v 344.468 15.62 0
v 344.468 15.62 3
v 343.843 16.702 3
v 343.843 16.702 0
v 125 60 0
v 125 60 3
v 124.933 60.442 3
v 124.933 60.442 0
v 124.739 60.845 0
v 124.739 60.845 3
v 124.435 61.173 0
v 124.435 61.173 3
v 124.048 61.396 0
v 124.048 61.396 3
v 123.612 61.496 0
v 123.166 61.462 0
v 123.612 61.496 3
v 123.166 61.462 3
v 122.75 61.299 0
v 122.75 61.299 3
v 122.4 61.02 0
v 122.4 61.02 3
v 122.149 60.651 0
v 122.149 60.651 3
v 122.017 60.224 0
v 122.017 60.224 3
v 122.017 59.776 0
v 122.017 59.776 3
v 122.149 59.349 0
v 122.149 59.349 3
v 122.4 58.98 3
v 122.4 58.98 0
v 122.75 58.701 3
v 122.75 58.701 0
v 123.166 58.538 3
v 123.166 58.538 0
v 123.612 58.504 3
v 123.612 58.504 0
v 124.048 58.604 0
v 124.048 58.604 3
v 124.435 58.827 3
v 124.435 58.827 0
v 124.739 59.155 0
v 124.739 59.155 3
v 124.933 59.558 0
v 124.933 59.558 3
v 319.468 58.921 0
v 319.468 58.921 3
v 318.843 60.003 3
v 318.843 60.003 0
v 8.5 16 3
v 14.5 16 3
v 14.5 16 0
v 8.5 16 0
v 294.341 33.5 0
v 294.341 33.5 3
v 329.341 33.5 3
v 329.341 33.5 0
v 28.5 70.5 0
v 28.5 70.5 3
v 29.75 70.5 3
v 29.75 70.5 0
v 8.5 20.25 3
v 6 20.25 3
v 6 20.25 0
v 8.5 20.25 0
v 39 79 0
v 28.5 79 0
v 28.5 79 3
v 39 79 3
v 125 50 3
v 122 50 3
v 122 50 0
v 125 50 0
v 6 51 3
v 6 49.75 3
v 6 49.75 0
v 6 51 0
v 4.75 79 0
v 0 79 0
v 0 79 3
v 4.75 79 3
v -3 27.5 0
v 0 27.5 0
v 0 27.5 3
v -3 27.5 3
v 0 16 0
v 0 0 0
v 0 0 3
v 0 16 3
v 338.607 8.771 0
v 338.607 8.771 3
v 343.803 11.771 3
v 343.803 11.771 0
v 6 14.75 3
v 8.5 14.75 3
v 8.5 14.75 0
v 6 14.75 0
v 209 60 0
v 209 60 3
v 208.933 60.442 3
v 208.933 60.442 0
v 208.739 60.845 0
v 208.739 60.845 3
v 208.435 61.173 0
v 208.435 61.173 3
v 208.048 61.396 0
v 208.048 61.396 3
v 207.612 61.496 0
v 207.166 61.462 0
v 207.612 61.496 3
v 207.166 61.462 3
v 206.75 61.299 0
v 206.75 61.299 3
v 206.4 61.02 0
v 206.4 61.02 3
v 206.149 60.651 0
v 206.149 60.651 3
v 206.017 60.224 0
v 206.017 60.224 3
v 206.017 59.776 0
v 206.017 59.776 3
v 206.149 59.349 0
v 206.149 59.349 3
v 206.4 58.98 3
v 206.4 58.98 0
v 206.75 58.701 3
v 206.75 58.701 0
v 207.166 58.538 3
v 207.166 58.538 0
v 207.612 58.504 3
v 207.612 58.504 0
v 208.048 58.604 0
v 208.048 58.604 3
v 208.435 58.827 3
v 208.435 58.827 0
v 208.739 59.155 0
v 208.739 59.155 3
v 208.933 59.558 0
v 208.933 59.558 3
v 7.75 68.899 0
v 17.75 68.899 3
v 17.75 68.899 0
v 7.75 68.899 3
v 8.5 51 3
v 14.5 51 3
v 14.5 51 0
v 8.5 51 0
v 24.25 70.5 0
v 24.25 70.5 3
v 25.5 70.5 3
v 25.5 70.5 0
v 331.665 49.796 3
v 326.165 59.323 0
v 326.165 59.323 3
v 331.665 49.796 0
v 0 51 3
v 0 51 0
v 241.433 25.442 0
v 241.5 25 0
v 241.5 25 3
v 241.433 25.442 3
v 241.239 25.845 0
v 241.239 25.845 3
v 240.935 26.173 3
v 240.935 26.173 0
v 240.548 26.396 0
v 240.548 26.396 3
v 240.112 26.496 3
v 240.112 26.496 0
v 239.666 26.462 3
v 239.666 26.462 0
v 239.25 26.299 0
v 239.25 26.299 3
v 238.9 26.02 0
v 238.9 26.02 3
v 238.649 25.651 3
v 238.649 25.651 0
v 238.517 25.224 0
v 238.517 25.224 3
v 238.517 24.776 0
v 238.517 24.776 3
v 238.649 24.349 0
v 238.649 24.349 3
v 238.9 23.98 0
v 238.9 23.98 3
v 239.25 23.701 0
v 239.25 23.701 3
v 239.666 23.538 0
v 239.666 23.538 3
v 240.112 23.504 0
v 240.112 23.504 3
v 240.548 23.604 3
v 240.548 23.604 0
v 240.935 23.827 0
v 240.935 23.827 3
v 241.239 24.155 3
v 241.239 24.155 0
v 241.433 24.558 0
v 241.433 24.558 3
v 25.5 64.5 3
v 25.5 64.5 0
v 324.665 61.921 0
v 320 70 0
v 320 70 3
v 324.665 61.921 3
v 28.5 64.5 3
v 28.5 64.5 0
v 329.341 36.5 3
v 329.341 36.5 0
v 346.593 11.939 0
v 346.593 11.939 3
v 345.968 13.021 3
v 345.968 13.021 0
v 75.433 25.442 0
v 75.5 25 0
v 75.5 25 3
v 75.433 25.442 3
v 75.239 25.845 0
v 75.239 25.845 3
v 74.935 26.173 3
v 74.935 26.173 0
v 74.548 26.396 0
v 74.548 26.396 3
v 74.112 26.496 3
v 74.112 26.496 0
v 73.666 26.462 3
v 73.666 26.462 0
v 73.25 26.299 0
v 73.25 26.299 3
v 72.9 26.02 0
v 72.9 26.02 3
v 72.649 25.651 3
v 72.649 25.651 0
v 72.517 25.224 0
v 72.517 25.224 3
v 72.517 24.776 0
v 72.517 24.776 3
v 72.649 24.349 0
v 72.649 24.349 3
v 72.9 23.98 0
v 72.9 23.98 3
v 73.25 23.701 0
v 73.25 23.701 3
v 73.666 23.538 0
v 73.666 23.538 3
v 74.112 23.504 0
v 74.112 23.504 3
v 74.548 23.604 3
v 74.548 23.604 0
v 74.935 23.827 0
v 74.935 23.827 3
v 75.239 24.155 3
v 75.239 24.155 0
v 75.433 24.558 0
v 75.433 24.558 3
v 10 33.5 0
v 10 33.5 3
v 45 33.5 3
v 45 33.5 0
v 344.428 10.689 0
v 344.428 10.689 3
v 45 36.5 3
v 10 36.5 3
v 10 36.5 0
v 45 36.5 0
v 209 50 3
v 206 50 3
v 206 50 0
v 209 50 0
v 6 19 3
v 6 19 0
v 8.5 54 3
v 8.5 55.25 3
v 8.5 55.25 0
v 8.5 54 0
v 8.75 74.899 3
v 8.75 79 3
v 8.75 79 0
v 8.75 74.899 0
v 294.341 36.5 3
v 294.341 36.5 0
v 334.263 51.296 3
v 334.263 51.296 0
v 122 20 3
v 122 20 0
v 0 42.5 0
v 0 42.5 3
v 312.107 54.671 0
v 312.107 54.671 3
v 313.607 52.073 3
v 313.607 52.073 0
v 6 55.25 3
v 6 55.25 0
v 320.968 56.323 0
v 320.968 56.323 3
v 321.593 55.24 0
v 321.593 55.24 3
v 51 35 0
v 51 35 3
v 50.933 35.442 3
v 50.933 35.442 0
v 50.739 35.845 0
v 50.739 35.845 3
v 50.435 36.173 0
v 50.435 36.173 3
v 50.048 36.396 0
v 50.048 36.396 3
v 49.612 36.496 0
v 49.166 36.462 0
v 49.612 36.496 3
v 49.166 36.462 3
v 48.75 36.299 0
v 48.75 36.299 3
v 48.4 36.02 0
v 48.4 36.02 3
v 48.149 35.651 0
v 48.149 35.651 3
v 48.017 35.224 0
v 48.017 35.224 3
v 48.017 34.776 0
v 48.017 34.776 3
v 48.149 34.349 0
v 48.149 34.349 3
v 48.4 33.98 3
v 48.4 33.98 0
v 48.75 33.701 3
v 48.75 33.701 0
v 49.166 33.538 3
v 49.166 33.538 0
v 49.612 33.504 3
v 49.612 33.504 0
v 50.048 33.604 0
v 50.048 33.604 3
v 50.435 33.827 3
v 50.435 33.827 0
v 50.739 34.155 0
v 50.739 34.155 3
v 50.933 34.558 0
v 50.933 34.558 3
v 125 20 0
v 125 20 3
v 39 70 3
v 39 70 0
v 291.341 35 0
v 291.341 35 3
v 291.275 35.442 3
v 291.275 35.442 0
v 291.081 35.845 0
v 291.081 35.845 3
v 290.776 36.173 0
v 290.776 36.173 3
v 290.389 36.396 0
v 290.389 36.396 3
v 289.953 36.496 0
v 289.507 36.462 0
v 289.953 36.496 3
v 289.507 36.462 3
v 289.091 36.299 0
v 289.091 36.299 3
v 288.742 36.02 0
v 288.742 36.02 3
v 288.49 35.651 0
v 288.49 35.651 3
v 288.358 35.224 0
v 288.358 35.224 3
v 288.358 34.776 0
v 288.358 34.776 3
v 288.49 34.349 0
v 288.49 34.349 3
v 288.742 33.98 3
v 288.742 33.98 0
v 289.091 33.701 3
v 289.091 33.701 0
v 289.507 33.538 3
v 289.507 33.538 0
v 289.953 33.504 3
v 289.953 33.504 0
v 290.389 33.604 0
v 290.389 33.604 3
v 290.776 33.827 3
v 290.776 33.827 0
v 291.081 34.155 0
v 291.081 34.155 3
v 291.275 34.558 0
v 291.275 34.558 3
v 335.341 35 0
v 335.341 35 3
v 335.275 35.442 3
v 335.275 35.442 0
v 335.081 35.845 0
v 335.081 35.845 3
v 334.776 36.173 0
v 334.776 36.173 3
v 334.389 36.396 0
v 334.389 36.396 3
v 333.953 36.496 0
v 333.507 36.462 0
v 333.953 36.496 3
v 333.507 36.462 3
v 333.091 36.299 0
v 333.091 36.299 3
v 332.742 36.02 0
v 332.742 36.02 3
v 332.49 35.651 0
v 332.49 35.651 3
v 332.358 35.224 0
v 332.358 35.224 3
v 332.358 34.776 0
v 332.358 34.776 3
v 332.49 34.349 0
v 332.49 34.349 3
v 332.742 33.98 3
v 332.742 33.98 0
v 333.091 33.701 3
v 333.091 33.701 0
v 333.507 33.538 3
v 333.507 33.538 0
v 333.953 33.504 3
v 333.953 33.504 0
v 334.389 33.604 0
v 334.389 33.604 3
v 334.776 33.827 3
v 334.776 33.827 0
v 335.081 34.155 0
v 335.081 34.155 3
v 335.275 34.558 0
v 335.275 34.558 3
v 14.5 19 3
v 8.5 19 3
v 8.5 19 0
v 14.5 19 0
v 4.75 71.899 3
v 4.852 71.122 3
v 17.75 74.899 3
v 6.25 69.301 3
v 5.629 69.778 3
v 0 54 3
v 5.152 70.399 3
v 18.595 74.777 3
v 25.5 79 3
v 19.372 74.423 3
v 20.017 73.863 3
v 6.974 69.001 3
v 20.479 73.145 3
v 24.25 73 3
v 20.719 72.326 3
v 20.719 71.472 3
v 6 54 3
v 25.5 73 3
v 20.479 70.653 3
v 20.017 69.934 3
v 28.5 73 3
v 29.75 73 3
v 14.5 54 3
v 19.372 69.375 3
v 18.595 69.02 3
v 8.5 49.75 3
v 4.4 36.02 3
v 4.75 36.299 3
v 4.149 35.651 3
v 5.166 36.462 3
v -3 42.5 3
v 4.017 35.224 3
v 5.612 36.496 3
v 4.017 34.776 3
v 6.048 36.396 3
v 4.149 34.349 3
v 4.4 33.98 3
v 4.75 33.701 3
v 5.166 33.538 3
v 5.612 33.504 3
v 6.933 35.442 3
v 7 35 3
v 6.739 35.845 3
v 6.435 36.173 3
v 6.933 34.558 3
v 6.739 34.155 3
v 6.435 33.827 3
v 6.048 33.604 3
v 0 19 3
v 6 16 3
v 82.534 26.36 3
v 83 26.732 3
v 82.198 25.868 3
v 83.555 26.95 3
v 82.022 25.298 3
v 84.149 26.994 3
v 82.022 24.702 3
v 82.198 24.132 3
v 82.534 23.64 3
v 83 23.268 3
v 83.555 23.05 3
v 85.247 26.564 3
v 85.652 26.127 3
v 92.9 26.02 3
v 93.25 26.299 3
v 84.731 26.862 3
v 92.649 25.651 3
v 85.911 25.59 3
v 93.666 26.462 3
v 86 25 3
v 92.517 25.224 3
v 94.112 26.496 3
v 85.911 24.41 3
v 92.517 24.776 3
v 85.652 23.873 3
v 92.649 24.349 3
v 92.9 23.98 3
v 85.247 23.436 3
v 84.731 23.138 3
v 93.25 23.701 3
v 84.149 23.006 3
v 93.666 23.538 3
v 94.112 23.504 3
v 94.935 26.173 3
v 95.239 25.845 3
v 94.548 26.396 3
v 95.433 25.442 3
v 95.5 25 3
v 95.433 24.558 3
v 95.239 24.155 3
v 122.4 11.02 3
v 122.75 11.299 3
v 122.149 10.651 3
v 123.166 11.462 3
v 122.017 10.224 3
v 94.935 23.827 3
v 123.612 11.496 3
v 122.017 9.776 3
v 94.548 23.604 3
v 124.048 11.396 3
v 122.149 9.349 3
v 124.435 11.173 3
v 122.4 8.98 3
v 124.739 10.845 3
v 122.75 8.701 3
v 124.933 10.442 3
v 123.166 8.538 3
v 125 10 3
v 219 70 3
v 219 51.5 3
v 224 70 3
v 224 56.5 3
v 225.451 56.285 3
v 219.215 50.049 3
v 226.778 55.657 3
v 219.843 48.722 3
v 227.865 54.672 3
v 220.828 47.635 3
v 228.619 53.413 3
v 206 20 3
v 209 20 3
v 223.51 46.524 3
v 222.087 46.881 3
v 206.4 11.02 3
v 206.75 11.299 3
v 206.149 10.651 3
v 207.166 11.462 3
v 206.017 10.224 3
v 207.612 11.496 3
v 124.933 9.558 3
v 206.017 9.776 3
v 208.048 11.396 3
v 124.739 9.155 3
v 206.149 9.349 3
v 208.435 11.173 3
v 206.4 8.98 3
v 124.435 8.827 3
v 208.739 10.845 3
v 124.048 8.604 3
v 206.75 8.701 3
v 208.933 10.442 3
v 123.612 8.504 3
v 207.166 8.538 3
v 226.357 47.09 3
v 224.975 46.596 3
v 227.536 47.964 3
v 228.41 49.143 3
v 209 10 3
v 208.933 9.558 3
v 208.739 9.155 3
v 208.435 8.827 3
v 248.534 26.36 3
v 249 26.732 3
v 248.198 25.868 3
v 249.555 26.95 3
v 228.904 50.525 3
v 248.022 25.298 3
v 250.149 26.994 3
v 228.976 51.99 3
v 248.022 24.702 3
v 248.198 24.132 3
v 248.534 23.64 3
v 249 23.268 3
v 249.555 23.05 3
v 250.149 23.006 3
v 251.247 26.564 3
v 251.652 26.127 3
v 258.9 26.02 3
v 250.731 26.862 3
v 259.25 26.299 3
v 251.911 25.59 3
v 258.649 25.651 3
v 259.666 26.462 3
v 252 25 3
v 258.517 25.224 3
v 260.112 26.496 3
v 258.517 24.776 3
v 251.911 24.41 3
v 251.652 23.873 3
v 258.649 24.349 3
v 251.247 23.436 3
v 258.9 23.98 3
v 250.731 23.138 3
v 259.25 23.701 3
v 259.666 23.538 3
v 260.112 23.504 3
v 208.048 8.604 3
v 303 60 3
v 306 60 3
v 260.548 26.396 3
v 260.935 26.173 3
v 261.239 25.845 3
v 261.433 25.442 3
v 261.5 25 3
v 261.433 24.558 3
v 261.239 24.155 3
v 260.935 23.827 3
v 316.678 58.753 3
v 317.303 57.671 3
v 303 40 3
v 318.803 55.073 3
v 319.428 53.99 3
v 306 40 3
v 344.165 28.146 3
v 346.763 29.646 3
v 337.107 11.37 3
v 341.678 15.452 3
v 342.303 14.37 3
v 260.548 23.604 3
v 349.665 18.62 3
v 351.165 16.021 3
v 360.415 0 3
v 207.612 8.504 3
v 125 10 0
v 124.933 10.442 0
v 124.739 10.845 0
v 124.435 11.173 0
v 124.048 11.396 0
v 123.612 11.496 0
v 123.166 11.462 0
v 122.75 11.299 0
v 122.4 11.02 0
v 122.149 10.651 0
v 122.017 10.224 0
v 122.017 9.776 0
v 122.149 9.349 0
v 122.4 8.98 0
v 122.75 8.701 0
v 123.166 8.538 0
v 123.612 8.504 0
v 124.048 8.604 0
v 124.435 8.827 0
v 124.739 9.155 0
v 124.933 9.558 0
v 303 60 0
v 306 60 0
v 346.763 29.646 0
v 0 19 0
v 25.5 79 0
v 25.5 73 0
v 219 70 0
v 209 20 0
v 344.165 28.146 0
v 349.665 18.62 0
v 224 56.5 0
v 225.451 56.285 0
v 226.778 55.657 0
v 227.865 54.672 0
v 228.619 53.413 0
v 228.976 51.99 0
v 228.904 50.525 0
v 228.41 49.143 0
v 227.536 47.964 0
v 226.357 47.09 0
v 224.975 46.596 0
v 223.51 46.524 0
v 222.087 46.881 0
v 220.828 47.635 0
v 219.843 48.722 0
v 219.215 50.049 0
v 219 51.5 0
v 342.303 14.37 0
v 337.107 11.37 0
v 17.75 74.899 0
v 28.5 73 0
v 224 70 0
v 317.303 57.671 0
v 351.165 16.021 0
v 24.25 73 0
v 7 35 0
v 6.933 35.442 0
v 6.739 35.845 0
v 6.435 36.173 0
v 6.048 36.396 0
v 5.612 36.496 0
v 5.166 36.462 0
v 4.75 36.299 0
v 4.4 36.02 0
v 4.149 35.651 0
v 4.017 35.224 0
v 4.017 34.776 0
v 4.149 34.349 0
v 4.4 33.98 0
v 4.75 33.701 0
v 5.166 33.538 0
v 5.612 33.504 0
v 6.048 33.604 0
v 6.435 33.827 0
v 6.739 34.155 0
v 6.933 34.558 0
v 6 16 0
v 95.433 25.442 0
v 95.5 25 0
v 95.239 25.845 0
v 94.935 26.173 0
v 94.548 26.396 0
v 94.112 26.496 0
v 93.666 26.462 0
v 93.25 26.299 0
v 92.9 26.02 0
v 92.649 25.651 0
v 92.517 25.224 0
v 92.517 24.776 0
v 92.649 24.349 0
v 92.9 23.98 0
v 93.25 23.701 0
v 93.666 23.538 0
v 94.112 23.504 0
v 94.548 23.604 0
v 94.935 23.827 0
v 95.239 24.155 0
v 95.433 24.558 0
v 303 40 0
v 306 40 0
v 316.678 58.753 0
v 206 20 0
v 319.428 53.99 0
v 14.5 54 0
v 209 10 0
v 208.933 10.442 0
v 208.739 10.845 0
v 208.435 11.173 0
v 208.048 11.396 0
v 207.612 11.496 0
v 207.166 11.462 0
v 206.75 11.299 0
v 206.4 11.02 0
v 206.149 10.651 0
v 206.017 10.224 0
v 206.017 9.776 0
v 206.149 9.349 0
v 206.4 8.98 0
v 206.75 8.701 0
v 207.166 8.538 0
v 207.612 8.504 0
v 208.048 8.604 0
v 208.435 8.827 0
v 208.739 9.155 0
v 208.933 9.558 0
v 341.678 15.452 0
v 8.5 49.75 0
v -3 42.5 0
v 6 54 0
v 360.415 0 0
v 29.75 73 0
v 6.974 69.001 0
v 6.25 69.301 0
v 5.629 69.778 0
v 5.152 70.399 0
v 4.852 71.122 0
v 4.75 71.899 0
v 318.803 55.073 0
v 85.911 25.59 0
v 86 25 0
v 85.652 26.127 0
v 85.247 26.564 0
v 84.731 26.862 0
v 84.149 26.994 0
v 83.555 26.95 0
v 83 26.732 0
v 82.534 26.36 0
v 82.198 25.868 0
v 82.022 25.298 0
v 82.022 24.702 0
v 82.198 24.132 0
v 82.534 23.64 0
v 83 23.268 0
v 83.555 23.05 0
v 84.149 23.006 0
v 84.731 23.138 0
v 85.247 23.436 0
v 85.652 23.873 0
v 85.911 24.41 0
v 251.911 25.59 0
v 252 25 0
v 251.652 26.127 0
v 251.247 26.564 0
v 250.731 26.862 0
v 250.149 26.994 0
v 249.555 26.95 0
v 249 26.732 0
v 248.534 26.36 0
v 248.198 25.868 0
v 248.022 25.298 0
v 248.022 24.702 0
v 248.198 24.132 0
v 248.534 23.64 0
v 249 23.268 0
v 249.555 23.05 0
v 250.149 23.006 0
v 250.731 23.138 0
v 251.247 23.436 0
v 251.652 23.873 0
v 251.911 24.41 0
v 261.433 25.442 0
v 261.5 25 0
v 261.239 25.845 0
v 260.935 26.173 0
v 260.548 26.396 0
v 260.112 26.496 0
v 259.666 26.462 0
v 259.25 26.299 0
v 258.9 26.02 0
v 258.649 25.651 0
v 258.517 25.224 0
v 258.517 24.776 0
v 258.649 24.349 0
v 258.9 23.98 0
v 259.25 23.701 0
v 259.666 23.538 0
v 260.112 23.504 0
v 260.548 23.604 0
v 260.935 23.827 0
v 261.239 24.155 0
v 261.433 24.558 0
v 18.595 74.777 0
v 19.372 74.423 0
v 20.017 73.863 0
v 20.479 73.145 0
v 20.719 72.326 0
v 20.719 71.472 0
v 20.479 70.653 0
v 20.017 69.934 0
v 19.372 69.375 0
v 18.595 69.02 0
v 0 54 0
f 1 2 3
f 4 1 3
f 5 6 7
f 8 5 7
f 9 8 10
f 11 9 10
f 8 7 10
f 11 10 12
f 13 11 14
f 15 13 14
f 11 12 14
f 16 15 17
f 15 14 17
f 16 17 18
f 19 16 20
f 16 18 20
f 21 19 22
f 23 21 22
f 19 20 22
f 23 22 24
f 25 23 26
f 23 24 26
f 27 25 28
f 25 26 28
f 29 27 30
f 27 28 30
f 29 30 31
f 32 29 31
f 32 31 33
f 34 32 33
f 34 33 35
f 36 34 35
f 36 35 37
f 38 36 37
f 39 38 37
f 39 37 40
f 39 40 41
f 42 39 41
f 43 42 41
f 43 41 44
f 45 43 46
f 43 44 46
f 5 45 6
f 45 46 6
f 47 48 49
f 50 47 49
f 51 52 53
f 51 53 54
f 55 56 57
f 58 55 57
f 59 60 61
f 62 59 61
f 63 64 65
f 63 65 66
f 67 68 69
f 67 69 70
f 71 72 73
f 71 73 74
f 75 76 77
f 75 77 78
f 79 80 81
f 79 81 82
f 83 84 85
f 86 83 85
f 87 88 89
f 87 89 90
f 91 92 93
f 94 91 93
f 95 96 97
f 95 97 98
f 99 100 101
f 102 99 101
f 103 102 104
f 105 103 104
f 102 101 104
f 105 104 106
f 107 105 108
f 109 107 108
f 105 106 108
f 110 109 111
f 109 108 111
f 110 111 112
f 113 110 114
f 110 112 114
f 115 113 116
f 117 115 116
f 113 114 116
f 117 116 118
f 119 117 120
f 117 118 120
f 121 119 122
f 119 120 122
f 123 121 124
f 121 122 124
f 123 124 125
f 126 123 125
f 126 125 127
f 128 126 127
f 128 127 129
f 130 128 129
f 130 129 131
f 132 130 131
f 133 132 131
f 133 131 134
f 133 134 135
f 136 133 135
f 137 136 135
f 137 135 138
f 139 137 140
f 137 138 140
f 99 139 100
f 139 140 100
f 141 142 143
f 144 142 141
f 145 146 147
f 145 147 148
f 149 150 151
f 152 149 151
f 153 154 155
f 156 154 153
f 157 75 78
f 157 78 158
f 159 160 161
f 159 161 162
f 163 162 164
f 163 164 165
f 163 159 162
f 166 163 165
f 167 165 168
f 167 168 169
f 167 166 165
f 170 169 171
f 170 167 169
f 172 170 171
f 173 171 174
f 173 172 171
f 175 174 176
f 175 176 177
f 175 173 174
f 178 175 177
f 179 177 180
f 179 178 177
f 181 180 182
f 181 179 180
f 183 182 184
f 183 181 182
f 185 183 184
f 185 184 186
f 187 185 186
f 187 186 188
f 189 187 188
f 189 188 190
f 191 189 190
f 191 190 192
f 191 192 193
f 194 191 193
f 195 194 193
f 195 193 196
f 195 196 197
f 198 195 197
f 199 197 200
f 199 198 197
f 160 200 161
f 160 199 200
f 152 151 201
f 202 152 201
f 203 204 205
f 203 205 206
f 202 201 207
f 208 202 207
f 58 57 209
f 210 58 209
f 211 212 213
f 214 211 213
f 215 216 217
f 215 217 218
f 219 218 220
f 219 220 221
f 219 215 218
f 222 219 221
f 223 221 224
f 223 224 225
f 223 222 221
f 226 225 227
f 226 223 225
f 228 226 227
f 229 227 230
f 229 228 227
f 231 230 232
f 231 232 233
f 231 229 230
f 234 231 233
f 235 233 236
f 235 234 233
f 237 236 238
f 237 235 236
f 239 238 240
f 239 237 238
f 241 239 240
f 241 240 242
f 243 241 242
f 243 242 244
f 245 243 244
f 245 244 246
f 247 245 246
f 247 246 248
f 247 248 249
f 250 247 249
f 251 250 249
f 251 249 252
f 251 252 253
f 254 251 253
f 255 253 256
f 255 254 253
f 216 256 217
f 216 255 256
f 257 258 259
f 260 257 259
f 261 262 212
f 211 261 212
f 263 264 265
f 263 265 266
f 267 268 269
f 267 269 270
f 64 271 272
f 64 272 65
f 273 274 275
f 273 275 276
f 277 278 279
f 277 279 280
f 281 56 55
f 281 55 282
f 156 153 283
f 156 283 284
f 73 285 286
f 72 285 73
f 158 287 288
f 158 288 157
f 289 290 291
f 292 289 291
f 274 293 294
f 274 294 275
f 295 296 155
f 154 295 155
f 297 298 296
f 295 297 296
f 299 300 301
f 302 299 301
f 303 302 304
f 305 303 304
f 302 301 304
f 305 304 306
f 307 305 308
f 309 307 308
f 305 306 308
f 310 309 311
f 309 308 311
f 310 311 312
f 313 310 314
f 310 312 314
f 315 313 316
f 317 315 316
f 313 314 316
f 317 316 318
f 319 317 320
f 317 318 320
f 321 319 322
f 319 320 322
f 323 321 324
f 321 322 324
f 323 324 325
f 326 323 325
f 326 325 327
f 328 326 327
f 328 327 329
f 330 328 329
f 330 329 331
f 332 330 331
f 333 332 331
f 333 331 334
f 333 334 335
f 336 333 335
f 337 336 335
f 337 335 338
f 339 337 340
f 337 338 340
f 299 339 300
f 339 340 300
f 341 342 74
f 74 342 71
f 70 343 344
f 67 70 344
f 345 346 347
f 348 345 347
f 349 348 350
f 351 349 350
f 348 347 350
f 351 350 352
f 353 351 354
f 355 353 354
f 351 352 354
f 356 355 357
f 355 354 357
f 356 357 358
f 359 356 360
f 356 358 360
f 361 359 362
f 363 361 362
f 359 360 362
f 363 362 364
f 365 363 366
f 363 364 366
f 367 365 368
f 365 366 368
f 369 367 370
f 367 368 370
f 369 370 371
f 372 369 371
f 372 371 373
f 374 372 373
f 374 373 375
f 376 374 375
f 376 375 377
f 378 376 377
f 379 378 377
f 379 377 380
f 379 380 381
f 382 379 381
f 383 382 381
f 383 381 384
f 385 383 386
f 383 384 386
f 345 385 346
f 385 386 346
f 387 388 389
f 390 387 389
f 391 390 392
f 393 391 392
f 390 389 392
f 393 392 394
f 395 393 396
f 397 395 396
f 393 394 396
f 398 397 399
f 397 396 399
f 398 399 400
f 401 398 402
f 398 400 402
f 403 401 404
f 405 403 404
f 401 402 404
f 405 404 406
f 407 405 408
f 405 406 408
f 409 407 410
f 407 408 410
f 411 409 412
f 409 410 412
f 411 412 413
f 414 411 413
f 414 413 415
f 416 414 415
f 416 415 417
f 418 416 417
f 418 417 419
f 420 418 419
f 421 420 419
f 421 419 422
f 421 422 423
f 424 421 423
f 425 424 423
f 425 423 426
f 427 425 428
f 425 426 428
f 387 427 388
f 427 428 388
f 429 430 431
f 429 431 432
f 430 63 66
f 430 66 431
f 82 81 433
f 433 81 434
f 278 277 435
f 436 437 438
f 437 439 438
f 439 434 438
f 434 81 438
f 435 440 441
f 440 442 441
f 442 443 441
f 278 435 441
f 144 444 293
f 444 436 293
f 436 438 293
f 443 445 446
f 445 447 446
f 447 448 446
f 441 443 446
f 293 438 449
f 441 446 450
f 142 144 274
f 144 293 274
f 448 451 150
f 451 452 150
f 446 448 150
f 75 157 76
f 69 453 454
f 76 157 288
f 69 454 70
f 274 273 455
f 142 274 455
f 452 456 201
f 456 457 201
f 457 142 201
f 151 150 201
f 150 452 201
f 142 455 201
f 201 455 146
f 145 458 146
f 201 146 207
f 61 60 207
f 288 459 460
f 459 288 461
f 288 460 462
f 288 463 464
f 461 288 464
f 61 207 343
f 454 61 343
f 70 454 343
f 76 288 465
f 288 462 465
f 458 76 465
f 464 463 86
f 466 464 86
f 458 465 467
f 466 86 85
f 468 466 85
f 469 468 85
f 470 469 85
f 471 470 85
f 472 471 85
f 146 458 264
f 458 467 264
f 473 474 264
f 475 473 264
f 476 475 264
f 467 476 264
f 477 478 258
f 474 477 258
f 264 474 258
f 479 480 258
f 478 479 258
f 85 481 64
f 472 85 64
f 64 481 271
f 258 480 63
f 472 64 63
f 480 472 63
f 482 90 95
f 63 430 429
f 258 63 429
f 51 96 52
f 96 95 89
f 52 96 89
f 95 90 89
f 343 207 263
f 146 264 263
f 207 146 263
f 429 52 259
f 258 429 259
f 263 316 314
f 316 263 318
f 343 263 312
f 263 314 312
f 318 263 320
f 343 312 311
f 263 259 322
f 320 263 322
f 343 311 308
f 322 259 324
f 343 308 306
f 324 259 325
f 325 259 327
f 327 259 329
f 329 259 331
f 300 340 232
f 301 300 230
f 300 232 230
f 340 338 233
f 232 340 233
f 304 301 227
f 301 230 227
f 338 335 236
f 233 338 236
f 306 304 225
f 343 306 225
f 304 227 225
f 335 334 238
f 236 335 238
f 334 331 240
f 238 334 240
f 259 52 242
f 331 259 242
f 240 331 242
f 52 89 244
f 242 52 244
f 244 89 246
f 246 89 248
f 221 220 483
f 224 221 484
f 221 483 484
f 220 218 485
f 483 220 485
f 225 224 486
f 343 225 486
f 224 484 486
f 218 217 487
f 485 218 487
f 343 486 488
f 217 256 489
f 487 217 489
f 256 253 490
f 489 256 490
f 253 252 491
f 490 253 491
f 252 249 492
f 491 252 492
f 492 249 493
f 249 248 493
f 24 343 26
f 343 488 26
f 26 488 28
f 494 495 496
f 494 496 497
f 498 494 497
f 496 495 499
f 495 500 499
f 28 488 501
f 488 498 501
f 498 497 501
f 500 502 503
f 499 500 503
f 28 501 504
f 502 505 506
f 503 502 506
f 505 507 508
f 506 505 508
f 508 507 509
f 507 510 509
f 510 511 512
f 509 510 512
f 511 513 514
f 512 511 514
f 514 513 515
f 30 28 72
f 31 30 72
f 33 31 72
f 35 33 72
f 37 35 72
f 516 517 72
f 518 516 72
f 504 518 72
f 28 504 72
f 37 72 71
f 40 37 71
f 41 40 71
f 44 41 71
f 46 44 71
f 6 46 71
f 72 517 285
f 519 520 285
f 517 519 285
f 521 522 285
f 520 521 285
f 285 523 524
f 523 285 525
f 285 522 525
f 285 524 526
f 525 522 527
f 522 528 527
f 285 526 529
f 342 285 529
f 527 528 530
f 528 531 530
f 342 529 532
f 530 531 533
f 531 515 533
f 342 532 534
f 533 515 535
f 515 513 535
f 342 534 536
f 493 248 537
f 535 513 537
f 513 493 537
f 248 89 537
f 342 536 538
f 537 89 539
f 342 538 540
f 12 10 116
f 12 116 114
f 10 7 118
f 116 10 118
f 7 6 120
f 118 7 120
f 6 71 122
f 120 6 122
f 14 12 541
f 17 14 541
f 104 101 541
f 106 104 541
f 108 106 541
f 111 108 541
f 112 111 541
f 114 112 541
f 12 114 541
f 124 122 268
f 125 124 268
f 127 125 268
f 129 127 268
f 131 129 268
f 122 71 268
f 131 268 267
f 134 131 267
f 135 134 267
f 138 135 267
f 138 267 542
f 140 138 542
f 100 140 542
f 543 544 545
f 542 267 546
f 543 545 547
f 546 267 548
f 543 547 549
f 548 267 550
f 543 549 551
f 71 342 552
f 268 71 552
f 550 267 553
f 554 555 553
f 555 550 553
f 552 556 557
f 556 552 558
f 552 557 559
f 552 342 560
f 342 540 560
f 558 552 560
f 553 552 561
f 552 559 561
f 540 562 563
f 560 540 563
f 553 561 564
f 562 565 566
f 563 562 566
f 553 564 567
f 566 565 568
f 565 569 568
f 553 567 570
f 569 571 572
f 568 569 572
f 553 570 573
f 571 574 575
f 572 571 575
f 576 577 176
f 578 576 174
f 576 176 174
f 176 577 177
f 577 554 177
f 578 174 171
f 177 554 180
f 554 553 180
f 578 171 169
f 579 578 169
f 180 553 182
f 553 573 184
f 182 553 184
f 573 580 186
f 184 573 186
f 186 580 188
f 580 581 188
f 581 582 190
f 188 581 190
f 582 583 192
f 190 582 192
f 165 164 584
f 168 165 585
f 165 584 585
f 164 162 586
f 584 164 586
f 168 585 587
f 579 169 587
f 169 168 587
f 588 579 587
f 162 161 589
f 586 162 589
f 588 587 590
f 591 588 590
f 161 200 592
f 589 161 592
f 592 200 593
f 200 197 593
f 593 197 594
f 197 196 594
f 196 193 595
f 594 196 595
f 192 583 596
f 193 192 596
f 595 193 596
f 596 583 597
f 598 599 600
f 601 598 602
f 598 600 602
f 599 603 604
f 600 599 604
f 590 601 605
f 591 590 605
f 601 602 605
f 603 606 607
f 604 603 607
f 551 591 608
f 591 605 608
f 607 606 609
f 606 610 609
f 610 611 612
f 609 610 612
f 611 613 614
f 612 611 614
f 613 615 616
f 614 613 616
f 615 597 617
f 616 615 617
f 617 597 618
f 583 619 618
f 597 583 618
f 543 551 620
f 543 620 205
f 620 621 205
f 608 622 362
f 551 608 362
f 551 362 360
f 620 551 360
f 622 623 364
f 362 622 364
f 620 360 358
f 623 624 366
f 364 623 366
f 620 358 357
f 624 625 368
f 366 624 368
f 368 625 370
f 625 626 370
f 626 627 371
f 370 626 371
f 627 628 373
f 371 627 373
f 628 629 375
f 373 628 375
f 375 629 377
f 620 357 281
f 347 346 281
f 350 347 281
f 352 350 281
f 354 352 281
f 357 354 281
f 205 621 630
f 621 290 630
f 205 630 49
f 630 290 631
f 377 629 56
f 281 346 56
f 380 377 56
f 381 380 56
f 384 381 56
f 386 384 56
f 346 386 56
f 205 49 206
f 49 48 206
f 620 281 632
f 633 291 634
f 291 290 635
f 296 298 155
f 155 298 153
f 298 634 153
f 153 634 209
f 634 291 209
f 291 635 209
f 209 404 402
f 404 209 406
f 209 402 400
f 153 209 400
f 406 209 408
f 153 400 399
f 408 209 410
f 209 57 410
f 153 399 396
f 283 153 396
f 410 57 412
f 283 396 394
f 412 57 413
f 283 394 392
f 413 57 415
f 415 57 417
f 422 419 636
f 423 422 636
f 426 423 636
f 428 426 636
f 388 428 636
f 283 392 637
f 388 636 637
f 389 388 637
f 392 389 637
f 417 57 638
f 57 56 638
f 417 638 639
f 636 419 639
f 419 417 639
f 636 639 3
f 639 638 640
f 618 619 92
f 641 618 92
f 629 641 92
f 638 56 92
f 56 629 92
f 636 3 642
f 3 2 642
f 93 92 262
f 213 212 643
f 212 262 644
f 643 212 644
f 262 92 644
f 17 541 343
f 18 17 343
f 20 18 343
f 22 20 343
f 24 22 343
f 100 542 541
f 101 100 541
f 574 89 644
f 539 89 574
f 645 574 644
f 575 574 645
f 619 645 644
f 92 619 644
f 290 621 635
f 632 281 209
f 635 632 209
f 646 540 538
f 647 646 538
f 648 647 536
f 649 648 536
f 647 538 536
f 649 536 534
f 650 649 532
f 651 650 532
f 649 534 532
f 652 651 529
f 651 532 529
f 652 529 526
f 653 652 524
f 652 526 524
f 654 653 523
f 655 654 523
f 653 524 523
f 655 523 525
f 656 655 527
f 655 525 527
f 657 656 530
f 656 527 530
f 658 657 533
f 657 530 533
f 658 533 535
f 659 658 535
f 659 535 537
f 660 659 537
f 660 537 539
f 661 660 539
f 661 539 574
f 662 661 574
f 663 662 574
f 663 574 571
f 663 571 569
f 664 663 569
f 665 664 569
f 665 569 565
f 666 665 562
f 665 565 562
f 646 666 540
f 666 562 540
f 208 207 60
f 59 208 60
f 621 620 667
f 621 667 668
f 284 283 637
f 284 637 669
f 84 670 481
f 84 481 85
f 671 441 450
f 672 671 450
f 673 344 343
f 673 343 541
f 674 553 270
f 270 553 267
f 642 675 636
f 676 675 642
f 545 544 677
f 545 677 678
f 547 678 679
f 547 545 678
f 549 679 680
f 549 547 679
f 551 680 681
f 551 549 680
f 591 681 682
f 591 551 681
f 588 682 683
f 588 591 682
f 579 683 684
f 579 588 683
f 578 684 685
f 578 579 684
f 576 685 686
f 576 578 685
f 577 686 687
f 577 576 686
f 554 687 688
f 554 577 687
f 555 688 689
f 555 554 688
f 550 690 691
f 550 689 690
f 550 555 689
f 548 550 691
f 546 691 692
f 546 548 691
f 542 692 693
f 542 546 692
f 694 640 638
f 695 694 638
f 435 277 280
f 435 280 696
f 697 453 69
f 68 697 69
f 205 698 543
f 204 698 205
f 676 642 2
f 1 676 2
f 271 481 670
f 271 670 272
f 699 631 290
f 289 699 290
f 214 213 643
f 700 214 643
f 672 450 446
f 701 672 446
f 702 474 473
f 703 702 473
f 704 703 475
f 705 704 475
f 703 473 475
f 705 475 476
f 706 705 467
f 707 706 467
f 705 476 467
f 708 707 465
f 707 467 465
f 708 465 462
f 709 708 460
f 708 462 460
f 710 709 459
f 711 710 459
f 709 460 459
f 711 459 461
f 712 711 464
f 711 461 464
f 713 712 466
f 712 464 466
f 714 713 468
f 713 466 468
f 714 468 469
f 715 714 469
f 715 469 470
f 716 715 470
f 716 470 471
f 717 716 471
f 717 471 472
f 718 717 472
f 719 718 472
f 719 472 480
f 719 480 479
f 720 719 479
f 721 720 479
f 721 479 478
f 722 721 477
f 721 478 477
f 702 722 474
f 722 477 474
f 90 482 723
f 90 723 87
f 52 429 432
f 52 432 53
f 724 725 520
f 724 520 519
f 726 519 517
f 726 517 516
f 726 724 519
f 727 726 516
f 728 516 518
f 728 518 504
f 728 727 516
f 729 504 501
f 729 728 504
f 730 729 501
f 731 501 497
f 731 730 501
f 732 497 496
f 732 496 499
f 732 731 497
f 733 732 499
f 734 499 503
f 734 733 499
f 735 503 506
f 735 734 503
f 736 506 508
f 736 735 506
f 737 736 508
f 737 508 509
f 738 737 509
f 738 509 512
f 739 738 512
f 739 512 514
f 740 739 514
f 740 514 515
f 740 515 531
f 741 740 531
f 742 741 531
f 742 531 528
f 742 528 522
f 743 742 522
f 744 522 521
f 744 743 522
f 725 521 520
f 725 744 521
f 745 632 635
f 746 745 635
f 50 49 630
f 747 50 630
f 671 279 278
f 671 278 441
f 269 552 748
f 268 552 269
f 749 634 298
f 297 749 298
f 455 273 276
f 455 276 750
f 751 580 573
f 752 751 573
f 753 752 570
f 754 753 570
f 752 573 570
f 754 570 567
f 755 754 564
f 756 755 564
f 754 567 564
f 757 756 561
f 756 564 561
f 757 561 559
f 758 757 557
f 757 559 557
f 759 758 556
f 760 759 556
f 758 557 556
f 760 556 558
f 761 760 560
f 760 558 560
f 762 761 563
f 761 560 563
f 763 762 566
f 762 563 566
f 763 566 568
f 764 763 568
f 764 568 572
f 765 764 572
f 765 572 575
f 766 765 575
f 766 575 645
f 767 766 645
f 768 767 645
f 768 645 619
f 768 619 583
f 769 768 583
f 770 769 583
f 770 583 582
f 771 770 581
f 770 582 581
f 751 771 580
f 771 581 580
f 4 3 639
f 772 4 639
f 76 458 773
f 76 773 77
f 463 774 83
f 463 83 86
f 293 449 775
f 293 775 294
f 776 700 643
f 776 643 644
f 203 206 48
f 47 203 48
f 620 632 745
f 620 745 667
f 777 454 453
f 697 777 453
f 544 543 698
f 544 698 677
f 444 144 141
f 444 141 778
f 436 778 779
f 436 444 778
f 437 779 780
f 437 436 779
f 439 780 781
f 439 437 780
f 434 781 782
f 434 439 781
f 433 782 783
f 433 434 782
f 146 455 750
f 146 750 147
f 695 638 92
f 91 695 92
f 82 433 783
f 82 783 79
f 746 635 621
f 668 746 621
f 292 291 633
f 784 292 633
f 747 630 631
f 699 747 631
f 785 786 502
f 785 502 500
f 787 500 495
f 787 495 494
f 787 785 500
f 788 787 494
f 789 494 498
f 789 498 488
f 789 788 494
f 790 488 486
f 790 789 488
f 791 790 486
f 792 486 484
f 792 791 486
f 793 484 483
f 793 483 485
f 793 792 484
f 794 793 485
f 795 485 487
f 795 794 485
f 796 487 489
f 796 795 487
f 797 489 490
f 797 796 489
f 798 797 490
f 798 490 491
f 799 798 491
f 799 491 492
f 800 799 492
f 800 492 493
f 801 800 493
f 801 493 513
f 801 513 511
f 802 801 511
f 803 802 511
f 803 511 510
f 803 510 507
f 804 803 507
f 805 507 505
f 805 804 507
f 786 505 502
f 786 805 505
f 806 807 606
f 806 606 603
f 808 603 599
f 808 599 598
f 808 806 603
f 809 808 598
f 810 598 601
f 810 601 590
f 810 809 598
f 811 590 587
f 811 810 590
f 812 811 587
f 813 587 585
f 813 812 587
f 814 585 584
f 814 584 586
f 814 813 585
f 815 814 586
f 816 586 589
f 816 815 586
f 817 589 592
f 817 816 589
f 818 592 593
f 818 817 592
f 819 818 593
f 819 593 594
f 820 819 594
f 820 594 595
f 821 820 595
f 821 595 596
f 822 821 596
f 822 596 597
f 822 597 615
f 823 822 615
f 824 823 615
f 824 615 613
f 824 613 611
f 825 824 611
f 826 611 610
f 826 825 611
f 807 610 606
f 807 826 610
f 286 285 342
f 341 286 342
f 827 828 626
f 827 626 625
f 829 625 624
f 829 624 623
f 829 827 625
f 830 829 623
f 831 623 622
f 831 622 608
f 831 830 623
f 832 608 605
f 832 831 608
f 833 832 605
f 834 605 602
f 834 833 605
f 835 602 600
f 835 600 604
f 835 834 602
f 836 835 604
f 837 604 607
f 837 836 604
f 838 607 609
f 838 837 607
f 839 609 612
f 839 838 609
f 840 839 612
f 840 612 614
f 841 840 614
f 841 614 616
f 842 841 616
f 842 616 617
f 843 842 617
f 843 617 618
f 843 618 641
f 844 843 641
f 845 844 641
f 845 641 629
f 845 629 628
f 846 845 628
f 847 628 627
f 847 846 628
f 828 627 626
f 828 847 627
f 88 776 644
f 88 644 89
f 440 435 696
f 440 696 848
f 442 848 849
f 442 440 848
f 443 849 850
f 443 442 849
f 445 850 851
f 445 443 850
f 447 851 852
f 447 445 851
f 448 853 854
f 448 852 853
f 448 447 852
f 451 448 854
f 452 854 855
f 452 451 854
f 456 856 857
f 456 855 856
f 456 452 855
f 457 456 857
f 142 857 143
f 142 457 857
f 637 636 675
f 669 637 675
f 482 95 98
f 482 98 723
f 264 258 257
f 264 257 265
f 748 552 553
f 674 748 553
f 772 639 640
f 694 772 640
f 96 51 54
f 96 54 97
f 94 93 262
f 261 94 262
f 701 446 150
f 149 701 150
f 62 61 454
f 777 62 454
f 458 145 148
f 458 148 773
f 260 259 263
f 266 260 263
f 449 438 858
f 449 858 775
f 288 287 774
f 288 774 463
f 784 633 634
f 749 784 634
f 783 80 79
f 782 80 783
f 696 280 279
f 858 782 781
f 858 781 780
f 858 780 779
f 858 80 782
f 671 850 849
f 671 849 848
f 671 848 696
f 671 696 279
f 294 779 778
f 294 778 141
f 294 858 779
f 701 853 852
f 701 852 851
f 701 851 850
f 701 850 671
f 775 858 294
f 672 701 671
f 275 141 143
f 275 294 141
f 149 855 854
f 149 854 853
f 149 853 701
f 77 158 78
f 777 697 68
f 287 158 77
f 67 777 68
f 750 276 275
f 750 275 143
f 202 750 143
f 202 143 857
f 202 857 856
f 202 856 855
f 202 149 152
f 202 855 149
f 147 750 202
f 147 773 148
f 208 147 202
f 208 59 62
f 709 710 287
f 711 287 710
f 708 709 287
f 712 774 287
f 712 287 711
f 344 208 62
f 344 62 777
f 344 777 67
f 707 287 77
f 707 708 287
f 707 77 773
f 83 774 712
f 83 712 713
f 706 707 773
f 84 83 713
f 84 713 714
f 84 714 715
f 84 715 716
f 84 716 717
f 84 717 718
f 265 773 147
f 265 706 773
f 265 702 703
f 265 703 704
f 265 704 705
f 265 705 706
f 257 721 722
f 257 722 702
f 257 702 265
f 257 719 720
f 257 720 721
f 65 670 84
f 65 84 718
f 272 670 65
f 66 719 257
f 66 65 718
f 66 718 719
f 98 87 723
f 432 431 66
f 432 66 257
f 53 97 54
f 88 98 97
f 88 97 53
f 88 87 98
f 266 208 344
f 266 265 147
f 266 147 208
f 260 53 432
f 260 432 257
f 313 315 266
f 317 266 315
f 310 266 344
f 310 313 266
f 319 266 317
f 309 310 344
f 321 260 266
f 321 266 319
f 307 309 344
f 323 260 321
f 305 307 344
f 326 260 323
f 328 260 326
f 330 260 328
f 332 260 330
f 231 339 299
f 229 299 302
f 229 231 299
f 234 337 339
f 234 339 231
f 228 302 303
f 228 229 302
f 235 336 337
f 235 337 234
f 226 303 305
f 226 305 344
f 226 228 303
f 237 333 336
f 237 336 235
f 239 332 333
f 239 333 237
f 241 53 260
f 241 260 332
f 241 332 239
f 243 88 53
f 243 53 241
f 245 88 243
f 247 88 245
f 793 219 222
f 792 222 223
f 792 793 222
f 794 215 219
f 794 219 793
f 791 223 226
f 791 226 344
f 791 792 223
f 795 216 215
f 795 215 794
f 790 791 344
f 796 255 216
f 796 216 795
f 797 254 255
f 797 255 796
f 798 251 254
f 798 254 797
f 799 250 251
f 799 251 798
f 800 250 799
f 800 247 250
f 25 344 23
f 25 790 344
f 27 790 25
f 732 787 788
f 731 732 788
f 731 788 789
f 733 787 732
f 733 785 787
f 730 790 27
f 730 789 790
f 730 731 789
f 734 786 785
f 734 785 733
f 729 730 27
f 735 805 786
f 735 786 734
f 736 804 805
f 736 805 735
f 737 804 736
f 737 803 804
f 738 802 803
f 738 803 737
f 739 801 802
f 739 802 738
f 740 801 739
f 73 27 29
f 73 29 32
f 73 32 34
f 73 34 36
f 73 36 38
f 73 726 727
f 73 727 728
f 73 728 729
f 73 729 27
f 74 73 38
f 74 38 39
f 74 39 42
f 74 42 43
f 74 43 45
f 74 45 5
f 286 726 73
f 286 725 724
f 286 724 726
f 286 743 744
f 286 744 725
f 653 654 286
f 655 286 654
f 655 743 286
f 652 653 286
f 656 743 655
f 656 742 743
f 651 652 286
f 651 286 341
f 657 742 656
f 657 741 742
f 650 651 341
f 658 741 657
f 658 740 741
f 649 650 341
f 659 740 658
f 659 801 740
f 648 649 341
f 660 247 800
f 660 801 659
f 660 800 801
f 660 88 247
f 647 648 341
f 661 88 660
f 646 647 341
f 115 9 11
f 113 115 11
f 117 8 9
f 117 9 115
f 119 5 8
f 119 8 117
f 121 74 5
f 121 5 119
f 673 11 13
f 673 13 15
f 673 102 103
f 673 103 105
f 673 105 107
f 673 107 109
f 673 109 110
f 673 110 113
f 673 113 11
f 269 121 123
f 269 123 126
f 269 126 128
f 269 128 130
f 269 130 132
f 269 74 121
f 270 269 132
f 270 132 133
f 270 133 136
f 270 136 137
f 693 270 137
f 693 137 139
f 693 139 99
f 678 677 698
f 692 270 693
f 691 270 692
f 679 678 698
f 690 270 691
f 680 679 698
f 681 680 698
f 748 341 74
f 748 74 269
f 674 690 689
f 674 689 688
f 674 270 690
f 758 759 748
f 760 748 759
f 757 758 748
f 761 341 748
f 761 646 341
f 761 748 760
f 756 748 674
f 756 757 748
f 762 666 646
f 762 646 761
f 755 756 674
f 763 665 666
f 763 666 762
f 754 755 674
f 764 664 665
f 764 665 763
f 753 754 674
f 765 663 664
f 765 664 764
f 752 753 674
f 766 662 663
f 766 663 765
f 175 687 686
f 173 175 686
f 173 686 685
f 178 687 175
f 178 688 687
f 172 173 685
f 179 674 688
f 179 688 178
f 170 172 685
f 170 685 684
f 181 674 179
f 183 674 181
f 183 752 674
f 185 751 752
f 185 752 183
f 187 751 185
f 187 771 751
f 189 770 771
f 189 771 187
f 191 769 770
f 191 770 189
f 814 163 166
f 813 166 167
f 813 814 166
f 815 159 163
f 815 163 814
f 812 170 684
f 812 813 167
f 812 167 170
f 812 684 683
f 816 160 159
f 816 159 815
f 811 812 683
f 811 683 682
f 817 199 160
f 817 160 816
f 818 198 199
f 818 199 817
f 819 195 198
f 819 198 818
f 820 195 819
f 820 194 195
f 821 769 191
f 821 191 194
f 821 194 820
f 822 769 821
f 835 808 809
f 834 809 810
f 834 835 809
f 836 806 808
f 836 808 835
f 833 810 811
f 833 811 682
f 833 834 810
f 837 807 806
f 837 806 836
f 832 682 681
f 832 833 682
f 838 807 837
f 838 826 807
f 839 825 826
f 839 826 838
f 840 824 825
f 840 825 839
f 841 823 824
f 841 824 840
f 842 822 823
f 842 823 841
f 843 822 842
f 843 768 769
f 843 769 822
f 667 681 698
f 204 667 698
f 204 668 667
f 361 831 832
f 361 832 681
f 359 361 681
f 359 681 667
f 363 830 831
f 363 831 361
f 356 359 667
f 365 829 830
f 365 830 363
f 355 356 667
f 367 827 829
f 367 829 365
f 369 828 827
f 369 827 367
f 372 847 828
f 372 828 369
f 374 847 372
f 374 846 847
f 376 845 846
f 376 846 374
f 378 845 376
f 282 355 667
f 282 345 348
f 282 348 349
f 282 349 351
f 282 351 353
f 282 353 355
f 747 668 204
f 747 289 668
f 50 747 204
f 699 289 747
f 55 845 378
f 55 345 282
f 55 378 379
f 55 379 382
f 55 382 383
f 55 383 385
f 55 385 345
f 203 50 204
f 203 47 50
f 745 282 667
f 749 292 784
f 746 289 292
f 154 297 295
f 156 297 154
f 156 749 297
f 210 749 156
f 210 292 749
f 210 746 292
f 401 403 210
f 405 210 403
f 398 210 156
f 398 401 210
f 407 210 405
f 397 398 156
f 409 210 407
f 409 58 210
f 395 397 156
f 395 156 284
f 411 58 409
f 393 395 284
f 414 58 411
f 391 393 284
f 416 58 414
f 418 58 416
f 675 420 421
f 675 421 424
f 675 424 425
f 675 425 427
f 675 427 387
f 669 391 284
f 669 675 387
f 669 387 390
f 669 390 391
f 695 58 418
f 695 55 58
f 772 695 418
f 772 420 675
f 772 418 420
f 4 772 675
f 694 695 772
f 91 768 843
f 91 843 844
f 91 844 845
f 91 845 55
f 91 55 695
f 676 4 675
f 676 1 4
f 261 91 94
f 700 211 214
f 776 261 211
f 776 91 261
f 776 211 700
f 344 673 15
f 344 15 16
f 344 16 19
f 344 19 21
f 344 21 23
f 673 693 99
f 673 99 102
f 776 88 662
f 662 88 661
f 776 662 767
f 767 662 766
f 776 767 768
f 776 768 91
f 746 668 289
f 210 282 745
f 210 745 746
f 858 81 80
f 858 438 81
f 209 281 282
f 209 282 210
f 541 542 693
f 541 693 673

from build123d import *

# Parameters (mm, degrees)
SKETCH_1_R             = 2
SKETCH_1_R_2           = 1.5
EXTRUDE_1_DEPTH        = 3
SKETCH_2_W             = 19
SKETCH_2_H             = 3
EXTRUDE_2_DEPTH        = 3
PATTERN_LINEAR_1_COUNT = 9
PATTERN_LINEAR_1_PITCH = 28
SKETCH_3_W             = 3
SKETCH_3_H             = 30
CUT_EXTRUDE_1_DEPTH    = 3
SKETCH_4_W             = 35
SKETCH_4_H             = 3
CUT_EXTRUDE_2_DEPTH    = 3
SKETCH_5_R             = 1.5
CUT_EXTRUDE_3_DEPTH    = 3
CUT_EXTRUDE_4_DEPTH    = 3
CUT_EXTRUDE_5_DEPTH    = 3
SKETCH_8_W             = 39
SKETCH_8_H             = 3
EXTRUDE_3_DEPTH        = 9
SKETCH_11_W            = 3
SKETCH_11_H            = 25
EXTRUDE_5_DEPTH        = 3
SKETCH_12_W            = 3
SKETCH_12_H            = 15
EXTRUDE_6_DEPTH        = 3
SKETCH_13_W            = 243
SKETCH_13_H            = 3
CUT_EXTRUDE_7_DEPTH    = 3
SKETCH_14_W            = 3
SKETCH_14_H            = 20
CUT_EXTRUDE_8_DEPTH    = 10
CUT_EXTRUDE_9_DEPTH    = 3
CUT_EXTRUDE_10_DEPTH   = 10
CUT_EXTRUDE_11_DEPTH   = 10


with BuildPart() as part:
    # Эскиз1 → Бобышка-Вытянуть1 (new body)
    with BuildSketch(Plane.XY):
        Polygon((320, 70), (360.414518843, 0), (0, 0), (0, 70), align=None)
        with Locations((84, 25)):
            Circle(SKETCH_1_R, mode=Mode.SUBTRACT)
        with Locations((250, 25)):
            Circle(SKETCH_1_R, mode=Mode.SUBTRACT)
        with Locations((94, 25)):
            Circle(SKETCH_1_R_2, mode=Mode.SUBTRACT)
        with Locations((74, 25)):
            Circle(SKETCH_1_R_2, mode=Mode.SUBTRACT)
        with Locations((240, 25)):
            Circle(SKETCH_1_R_2, mode=Mode.SUBTRACT)
        with Locations((260, 25)):
            Circle(SKETCH_1_R_2, mode=Mode.SUBTRACT)
    extrude(amount=EXTRUDE_1_DEPTH)

    # Эскиз2 → Бобышка-Вытянуть2 (add)
    with BuildSketch(Plane(origin=(0, 70, 0), x_dir=(1, 0, 0), z_dir=(0, 1, 0))):
        with Locations((291.5, -1.5)):
            Rectangle(SKETCH_2_W, SKETCH_2_H)
    extrude_2 = extrude(amount=EXTRUDE_2_DEPTH)

    # Линейный массив1: Бобышка-Вытянуть2 ×9
    with Locations(*[(-i * PATTERN_LINEAR_1_PITCH, 0, 0) for i in range(1, PATTERN_LINEAR_1_COUNT)]):
        add(extrude_2)

    # Эскиз3 → Вырез-Вытянуть1 (cut)
    with BuildSketch(Plane.XY.offset(3)):
        with Locations((207.5, 35)):
            Rectangle(SKETCH_3_W, SKETCH_3_H)
        with Locations((123.5, 35)):
            Rectangle(SKETCH_3_W, SKETCH_3_H)
    extrude(amount=-CUT_EXTRUDE_1_DEPTH, mode=Mode.SUBTRACT)

    # Эскиз4 → Вырез-Вытянуть2 (cut)
    with BuildSketch(Plane.XY.offset(3)):
        with Locations((311.841234018, 35)):
            Rectangle(SKETCH_4_W, SKETCH_4_H)
        with Locations((27.5, 35)):
            Rectangle(SKETCH_4_W, SKETCH_4_H)
    extrude(amount=-CUT_EXTRUDE_2_DEPTH, mode=Mode.SUBTRACT)

    # Эскиз5 → Вырез-Вытянуть3 (cut)
    with BuildSketch(Plane.XY.offset(3)):
        with Locations((5.5, 35)):
            Circle(SKETCH_5_R)
        with Locations((49.5, 35)):
            Circle(SKETCH_5_R)
        with Locations((123.5, 60)):
            Circle(SKETCH_5_R)
        with Locations((123.5, 10)):
            Circle(SKETCH_5_R)
        with Locations((207.5, 60)):
            Circle(SKETCH_5_R)
        with Locations((207.5, 10)):
            Circle(SKETCH_5_R)
        with Locations((289.841234018, 35)):
            Circle(SKETCH_5_R)
        with Locations((333.841234018, 35)):
            Circle(SKETCH_5_R)
    extrude(amount=-CUT_EXTRUDE_3_DEPTH, mode=Mode.SUBTRACT)

    # Эскиз6 → Вырез-Вытянуть4 (cut)
    with BuildSketch(Plane.XY.offset(3)):
        Polygon((0, 54), (6, 54), (6, 55.25), (8.5, 55.25), (8.5, 54), (14.5, 54), (14.5, 51), (8.5, 51), (8.5, 49.75), (6, 49.75), (6, 51), (0, 51), align=None)
        Polygon((0, 19), (6, 19), (6, 20.25), (8.5, 20.25), (8.5, 19), (14.5, 19), (14.5, 16), (8.5, 16), (8.5, 14.75), (6, 14.75), (6, 16), (0, 16), align=None)
    extrude(amount=-CUT_EXTRUDE_4_DEPTH, mode=Mode.SUBTRACT)

    # Эскиз7 → Вырез-Вытянуть5 (cut)
    with BuildSketch(Plane.XY.offset(3)):
        Polygon((324.664518843, 61.920816371), (319.468366421, 58.920816371), (318.843366421, 60.003348125), (316.678302911, 58.753348125), (317.303302911, 57.670816371), (312.107150488, 54.670816371), (313.607150488, 52.072740159), (318.803302911, 55.072740159), (319.428302911, 53.990208405), (321.593366421, 55.240208405), (320.968366421, 56.322740159), (326.164518843, 59.322740159), align=None)
        Polygon((349.664518843, 18.619546181), (344.468366421, 15.619546181), (343.843366421, 16.702077936), (341.678302911, 15.452077936), (342.303302911, 14.369546181), (337.107150488, 11.369546181), (338.607150488, 8.77146997), (343.803302911, 11.77146997), (344.428302911, 10.688938215), (346.593366421, 11.938938215), (345.968366421, 13.02146997), (351.164518843, 16.02146997), align=None)
    extrude(amount=-CUT_EXTRUDE_5_DEPTH, mode=Mode.SUBTRACT)

    # Эскиз8 → Бобышка-Вытянуть3 (add)
    with BuildSketch(Plane(origin=(0, 70, 0), x_dir=(1, 0, 0), z_dir=(0, 1, 0))):
        with Locations((19.5, -1.5)):
            Rectangle(SKETCH_8_W, SKETCH_8_H)
    extrude(amount=EXTRUDE_3_DEPTH)

    # Эскиз11 → Бобышка-Вытянуть5 (add)
    with BuildSketch(Plane(origin=(270.310889132, 156.064064606, 0), x_dir=(0, 0, -1), z_dir=(0.8660254037844416, 0.4999999999999949, 0))):
        with Locations((-1.5, -135.207259422)):
            Rectangle(SKETCH_11_W, SKETCH_11_H)
    extrude(amount=EXTRUDE_5_DEPTH)

    # Эскиз12 → Бобышка-Вытянуть6 (add)
    with BuildSketch(Plane.ZY):
        with Locations((1.5, 35)):
            Rectangle(SKETCH_12_W, SKETCH_12_H)
    extrude(amount=EXTRUDE_6_DEPTH)

    # Эскиз13 → Вырез-Вытянуть7 (cut)
    with BuildSketch(Plane.XY.offset(3)):
        with Locations((179.5, 71.5)):
            Rectangle(SKETCH_13_W, SKETCH_13_H)
    extrude(amount=-CUT_EXTRUDE_7_DEPTH, mode=Mode.SUBTRACT)

    # Эскиз14 → Вырез-Вытянуть8 (cut)
    with BuildSketch(Plane.XY.offset(3)):
        with Locations((304.5, 50)):
            Rectangle(SKETCH_14_W, SKETCH_14_H)
    extrude(amount=-CUT_EXTRUDE_8_DEPTH, mode=Mode.SUBTRACT)

    # Эскиз15 → Вырез-Вытянуть9 (cut)
    with BuildSketch(Plane.XY.offset(3)):
        Polygon((25.5, 79), (25.5, 73), (24.25, 73), (24.25, 70.5), (25.5, 70.5), (25.5, 64.5), (28.5, 64.5), (28.5, 70.5), (29.75, 70.5), (29.75, 73), (28.5, 73), (28.5, 79), align=None)
    extrude(amount=-CUT_EXTRUDE_9_DEPTH, mode=Mode.SUBTRACT)

    # Эскиз16 → Вырез-Вытянуть10 (cut)
    with BuildSketch(Plane.XY.offset(3)):
        with BuildLine():
            Line((8.75, 74.898901738), (17.75, 74.898901738))
            ThreePointArc((17.75, 74.898901738), (20.75, 71.898901738), (17.75, 68.898901738))
            Line((17.75, 68.898901738), (7.75, 68.898901738))
            ThreePointArc((7.75, 68.898901738), (5.628679656, 69.777581394), (4.75, 71.898901738))
            Line((4.75, 71.898901738), (4.75, 79))
            Line((4.75, 79), (8.75, 79))
            Line((8.75, 79), (8.75, 74.898901738))
        make_face()
    extrude(amount=-CUT_EXTRUDE_10_DEPTH, mode=Mode.SUBTRACT)

    # Эскиз17 → Вырез-Вытянуть11 (cut)
    with BuildSketch(Plane.XY.offset(3)):
        with BuildLine():
            Line((219, 51.5), (219, 70))
            Line((219, 70), (224, 70))
            Line((224, 70), (224, 56.5))
            ThreePointArc((224, 56.5), (227.535533906, 47.964466094), (219, 51.5))
        make_face()
    extrude(amount=-CUT_EXTRUDE_11_DEPTH, mode=Mode.SUBTRACT)


solid = part.part
